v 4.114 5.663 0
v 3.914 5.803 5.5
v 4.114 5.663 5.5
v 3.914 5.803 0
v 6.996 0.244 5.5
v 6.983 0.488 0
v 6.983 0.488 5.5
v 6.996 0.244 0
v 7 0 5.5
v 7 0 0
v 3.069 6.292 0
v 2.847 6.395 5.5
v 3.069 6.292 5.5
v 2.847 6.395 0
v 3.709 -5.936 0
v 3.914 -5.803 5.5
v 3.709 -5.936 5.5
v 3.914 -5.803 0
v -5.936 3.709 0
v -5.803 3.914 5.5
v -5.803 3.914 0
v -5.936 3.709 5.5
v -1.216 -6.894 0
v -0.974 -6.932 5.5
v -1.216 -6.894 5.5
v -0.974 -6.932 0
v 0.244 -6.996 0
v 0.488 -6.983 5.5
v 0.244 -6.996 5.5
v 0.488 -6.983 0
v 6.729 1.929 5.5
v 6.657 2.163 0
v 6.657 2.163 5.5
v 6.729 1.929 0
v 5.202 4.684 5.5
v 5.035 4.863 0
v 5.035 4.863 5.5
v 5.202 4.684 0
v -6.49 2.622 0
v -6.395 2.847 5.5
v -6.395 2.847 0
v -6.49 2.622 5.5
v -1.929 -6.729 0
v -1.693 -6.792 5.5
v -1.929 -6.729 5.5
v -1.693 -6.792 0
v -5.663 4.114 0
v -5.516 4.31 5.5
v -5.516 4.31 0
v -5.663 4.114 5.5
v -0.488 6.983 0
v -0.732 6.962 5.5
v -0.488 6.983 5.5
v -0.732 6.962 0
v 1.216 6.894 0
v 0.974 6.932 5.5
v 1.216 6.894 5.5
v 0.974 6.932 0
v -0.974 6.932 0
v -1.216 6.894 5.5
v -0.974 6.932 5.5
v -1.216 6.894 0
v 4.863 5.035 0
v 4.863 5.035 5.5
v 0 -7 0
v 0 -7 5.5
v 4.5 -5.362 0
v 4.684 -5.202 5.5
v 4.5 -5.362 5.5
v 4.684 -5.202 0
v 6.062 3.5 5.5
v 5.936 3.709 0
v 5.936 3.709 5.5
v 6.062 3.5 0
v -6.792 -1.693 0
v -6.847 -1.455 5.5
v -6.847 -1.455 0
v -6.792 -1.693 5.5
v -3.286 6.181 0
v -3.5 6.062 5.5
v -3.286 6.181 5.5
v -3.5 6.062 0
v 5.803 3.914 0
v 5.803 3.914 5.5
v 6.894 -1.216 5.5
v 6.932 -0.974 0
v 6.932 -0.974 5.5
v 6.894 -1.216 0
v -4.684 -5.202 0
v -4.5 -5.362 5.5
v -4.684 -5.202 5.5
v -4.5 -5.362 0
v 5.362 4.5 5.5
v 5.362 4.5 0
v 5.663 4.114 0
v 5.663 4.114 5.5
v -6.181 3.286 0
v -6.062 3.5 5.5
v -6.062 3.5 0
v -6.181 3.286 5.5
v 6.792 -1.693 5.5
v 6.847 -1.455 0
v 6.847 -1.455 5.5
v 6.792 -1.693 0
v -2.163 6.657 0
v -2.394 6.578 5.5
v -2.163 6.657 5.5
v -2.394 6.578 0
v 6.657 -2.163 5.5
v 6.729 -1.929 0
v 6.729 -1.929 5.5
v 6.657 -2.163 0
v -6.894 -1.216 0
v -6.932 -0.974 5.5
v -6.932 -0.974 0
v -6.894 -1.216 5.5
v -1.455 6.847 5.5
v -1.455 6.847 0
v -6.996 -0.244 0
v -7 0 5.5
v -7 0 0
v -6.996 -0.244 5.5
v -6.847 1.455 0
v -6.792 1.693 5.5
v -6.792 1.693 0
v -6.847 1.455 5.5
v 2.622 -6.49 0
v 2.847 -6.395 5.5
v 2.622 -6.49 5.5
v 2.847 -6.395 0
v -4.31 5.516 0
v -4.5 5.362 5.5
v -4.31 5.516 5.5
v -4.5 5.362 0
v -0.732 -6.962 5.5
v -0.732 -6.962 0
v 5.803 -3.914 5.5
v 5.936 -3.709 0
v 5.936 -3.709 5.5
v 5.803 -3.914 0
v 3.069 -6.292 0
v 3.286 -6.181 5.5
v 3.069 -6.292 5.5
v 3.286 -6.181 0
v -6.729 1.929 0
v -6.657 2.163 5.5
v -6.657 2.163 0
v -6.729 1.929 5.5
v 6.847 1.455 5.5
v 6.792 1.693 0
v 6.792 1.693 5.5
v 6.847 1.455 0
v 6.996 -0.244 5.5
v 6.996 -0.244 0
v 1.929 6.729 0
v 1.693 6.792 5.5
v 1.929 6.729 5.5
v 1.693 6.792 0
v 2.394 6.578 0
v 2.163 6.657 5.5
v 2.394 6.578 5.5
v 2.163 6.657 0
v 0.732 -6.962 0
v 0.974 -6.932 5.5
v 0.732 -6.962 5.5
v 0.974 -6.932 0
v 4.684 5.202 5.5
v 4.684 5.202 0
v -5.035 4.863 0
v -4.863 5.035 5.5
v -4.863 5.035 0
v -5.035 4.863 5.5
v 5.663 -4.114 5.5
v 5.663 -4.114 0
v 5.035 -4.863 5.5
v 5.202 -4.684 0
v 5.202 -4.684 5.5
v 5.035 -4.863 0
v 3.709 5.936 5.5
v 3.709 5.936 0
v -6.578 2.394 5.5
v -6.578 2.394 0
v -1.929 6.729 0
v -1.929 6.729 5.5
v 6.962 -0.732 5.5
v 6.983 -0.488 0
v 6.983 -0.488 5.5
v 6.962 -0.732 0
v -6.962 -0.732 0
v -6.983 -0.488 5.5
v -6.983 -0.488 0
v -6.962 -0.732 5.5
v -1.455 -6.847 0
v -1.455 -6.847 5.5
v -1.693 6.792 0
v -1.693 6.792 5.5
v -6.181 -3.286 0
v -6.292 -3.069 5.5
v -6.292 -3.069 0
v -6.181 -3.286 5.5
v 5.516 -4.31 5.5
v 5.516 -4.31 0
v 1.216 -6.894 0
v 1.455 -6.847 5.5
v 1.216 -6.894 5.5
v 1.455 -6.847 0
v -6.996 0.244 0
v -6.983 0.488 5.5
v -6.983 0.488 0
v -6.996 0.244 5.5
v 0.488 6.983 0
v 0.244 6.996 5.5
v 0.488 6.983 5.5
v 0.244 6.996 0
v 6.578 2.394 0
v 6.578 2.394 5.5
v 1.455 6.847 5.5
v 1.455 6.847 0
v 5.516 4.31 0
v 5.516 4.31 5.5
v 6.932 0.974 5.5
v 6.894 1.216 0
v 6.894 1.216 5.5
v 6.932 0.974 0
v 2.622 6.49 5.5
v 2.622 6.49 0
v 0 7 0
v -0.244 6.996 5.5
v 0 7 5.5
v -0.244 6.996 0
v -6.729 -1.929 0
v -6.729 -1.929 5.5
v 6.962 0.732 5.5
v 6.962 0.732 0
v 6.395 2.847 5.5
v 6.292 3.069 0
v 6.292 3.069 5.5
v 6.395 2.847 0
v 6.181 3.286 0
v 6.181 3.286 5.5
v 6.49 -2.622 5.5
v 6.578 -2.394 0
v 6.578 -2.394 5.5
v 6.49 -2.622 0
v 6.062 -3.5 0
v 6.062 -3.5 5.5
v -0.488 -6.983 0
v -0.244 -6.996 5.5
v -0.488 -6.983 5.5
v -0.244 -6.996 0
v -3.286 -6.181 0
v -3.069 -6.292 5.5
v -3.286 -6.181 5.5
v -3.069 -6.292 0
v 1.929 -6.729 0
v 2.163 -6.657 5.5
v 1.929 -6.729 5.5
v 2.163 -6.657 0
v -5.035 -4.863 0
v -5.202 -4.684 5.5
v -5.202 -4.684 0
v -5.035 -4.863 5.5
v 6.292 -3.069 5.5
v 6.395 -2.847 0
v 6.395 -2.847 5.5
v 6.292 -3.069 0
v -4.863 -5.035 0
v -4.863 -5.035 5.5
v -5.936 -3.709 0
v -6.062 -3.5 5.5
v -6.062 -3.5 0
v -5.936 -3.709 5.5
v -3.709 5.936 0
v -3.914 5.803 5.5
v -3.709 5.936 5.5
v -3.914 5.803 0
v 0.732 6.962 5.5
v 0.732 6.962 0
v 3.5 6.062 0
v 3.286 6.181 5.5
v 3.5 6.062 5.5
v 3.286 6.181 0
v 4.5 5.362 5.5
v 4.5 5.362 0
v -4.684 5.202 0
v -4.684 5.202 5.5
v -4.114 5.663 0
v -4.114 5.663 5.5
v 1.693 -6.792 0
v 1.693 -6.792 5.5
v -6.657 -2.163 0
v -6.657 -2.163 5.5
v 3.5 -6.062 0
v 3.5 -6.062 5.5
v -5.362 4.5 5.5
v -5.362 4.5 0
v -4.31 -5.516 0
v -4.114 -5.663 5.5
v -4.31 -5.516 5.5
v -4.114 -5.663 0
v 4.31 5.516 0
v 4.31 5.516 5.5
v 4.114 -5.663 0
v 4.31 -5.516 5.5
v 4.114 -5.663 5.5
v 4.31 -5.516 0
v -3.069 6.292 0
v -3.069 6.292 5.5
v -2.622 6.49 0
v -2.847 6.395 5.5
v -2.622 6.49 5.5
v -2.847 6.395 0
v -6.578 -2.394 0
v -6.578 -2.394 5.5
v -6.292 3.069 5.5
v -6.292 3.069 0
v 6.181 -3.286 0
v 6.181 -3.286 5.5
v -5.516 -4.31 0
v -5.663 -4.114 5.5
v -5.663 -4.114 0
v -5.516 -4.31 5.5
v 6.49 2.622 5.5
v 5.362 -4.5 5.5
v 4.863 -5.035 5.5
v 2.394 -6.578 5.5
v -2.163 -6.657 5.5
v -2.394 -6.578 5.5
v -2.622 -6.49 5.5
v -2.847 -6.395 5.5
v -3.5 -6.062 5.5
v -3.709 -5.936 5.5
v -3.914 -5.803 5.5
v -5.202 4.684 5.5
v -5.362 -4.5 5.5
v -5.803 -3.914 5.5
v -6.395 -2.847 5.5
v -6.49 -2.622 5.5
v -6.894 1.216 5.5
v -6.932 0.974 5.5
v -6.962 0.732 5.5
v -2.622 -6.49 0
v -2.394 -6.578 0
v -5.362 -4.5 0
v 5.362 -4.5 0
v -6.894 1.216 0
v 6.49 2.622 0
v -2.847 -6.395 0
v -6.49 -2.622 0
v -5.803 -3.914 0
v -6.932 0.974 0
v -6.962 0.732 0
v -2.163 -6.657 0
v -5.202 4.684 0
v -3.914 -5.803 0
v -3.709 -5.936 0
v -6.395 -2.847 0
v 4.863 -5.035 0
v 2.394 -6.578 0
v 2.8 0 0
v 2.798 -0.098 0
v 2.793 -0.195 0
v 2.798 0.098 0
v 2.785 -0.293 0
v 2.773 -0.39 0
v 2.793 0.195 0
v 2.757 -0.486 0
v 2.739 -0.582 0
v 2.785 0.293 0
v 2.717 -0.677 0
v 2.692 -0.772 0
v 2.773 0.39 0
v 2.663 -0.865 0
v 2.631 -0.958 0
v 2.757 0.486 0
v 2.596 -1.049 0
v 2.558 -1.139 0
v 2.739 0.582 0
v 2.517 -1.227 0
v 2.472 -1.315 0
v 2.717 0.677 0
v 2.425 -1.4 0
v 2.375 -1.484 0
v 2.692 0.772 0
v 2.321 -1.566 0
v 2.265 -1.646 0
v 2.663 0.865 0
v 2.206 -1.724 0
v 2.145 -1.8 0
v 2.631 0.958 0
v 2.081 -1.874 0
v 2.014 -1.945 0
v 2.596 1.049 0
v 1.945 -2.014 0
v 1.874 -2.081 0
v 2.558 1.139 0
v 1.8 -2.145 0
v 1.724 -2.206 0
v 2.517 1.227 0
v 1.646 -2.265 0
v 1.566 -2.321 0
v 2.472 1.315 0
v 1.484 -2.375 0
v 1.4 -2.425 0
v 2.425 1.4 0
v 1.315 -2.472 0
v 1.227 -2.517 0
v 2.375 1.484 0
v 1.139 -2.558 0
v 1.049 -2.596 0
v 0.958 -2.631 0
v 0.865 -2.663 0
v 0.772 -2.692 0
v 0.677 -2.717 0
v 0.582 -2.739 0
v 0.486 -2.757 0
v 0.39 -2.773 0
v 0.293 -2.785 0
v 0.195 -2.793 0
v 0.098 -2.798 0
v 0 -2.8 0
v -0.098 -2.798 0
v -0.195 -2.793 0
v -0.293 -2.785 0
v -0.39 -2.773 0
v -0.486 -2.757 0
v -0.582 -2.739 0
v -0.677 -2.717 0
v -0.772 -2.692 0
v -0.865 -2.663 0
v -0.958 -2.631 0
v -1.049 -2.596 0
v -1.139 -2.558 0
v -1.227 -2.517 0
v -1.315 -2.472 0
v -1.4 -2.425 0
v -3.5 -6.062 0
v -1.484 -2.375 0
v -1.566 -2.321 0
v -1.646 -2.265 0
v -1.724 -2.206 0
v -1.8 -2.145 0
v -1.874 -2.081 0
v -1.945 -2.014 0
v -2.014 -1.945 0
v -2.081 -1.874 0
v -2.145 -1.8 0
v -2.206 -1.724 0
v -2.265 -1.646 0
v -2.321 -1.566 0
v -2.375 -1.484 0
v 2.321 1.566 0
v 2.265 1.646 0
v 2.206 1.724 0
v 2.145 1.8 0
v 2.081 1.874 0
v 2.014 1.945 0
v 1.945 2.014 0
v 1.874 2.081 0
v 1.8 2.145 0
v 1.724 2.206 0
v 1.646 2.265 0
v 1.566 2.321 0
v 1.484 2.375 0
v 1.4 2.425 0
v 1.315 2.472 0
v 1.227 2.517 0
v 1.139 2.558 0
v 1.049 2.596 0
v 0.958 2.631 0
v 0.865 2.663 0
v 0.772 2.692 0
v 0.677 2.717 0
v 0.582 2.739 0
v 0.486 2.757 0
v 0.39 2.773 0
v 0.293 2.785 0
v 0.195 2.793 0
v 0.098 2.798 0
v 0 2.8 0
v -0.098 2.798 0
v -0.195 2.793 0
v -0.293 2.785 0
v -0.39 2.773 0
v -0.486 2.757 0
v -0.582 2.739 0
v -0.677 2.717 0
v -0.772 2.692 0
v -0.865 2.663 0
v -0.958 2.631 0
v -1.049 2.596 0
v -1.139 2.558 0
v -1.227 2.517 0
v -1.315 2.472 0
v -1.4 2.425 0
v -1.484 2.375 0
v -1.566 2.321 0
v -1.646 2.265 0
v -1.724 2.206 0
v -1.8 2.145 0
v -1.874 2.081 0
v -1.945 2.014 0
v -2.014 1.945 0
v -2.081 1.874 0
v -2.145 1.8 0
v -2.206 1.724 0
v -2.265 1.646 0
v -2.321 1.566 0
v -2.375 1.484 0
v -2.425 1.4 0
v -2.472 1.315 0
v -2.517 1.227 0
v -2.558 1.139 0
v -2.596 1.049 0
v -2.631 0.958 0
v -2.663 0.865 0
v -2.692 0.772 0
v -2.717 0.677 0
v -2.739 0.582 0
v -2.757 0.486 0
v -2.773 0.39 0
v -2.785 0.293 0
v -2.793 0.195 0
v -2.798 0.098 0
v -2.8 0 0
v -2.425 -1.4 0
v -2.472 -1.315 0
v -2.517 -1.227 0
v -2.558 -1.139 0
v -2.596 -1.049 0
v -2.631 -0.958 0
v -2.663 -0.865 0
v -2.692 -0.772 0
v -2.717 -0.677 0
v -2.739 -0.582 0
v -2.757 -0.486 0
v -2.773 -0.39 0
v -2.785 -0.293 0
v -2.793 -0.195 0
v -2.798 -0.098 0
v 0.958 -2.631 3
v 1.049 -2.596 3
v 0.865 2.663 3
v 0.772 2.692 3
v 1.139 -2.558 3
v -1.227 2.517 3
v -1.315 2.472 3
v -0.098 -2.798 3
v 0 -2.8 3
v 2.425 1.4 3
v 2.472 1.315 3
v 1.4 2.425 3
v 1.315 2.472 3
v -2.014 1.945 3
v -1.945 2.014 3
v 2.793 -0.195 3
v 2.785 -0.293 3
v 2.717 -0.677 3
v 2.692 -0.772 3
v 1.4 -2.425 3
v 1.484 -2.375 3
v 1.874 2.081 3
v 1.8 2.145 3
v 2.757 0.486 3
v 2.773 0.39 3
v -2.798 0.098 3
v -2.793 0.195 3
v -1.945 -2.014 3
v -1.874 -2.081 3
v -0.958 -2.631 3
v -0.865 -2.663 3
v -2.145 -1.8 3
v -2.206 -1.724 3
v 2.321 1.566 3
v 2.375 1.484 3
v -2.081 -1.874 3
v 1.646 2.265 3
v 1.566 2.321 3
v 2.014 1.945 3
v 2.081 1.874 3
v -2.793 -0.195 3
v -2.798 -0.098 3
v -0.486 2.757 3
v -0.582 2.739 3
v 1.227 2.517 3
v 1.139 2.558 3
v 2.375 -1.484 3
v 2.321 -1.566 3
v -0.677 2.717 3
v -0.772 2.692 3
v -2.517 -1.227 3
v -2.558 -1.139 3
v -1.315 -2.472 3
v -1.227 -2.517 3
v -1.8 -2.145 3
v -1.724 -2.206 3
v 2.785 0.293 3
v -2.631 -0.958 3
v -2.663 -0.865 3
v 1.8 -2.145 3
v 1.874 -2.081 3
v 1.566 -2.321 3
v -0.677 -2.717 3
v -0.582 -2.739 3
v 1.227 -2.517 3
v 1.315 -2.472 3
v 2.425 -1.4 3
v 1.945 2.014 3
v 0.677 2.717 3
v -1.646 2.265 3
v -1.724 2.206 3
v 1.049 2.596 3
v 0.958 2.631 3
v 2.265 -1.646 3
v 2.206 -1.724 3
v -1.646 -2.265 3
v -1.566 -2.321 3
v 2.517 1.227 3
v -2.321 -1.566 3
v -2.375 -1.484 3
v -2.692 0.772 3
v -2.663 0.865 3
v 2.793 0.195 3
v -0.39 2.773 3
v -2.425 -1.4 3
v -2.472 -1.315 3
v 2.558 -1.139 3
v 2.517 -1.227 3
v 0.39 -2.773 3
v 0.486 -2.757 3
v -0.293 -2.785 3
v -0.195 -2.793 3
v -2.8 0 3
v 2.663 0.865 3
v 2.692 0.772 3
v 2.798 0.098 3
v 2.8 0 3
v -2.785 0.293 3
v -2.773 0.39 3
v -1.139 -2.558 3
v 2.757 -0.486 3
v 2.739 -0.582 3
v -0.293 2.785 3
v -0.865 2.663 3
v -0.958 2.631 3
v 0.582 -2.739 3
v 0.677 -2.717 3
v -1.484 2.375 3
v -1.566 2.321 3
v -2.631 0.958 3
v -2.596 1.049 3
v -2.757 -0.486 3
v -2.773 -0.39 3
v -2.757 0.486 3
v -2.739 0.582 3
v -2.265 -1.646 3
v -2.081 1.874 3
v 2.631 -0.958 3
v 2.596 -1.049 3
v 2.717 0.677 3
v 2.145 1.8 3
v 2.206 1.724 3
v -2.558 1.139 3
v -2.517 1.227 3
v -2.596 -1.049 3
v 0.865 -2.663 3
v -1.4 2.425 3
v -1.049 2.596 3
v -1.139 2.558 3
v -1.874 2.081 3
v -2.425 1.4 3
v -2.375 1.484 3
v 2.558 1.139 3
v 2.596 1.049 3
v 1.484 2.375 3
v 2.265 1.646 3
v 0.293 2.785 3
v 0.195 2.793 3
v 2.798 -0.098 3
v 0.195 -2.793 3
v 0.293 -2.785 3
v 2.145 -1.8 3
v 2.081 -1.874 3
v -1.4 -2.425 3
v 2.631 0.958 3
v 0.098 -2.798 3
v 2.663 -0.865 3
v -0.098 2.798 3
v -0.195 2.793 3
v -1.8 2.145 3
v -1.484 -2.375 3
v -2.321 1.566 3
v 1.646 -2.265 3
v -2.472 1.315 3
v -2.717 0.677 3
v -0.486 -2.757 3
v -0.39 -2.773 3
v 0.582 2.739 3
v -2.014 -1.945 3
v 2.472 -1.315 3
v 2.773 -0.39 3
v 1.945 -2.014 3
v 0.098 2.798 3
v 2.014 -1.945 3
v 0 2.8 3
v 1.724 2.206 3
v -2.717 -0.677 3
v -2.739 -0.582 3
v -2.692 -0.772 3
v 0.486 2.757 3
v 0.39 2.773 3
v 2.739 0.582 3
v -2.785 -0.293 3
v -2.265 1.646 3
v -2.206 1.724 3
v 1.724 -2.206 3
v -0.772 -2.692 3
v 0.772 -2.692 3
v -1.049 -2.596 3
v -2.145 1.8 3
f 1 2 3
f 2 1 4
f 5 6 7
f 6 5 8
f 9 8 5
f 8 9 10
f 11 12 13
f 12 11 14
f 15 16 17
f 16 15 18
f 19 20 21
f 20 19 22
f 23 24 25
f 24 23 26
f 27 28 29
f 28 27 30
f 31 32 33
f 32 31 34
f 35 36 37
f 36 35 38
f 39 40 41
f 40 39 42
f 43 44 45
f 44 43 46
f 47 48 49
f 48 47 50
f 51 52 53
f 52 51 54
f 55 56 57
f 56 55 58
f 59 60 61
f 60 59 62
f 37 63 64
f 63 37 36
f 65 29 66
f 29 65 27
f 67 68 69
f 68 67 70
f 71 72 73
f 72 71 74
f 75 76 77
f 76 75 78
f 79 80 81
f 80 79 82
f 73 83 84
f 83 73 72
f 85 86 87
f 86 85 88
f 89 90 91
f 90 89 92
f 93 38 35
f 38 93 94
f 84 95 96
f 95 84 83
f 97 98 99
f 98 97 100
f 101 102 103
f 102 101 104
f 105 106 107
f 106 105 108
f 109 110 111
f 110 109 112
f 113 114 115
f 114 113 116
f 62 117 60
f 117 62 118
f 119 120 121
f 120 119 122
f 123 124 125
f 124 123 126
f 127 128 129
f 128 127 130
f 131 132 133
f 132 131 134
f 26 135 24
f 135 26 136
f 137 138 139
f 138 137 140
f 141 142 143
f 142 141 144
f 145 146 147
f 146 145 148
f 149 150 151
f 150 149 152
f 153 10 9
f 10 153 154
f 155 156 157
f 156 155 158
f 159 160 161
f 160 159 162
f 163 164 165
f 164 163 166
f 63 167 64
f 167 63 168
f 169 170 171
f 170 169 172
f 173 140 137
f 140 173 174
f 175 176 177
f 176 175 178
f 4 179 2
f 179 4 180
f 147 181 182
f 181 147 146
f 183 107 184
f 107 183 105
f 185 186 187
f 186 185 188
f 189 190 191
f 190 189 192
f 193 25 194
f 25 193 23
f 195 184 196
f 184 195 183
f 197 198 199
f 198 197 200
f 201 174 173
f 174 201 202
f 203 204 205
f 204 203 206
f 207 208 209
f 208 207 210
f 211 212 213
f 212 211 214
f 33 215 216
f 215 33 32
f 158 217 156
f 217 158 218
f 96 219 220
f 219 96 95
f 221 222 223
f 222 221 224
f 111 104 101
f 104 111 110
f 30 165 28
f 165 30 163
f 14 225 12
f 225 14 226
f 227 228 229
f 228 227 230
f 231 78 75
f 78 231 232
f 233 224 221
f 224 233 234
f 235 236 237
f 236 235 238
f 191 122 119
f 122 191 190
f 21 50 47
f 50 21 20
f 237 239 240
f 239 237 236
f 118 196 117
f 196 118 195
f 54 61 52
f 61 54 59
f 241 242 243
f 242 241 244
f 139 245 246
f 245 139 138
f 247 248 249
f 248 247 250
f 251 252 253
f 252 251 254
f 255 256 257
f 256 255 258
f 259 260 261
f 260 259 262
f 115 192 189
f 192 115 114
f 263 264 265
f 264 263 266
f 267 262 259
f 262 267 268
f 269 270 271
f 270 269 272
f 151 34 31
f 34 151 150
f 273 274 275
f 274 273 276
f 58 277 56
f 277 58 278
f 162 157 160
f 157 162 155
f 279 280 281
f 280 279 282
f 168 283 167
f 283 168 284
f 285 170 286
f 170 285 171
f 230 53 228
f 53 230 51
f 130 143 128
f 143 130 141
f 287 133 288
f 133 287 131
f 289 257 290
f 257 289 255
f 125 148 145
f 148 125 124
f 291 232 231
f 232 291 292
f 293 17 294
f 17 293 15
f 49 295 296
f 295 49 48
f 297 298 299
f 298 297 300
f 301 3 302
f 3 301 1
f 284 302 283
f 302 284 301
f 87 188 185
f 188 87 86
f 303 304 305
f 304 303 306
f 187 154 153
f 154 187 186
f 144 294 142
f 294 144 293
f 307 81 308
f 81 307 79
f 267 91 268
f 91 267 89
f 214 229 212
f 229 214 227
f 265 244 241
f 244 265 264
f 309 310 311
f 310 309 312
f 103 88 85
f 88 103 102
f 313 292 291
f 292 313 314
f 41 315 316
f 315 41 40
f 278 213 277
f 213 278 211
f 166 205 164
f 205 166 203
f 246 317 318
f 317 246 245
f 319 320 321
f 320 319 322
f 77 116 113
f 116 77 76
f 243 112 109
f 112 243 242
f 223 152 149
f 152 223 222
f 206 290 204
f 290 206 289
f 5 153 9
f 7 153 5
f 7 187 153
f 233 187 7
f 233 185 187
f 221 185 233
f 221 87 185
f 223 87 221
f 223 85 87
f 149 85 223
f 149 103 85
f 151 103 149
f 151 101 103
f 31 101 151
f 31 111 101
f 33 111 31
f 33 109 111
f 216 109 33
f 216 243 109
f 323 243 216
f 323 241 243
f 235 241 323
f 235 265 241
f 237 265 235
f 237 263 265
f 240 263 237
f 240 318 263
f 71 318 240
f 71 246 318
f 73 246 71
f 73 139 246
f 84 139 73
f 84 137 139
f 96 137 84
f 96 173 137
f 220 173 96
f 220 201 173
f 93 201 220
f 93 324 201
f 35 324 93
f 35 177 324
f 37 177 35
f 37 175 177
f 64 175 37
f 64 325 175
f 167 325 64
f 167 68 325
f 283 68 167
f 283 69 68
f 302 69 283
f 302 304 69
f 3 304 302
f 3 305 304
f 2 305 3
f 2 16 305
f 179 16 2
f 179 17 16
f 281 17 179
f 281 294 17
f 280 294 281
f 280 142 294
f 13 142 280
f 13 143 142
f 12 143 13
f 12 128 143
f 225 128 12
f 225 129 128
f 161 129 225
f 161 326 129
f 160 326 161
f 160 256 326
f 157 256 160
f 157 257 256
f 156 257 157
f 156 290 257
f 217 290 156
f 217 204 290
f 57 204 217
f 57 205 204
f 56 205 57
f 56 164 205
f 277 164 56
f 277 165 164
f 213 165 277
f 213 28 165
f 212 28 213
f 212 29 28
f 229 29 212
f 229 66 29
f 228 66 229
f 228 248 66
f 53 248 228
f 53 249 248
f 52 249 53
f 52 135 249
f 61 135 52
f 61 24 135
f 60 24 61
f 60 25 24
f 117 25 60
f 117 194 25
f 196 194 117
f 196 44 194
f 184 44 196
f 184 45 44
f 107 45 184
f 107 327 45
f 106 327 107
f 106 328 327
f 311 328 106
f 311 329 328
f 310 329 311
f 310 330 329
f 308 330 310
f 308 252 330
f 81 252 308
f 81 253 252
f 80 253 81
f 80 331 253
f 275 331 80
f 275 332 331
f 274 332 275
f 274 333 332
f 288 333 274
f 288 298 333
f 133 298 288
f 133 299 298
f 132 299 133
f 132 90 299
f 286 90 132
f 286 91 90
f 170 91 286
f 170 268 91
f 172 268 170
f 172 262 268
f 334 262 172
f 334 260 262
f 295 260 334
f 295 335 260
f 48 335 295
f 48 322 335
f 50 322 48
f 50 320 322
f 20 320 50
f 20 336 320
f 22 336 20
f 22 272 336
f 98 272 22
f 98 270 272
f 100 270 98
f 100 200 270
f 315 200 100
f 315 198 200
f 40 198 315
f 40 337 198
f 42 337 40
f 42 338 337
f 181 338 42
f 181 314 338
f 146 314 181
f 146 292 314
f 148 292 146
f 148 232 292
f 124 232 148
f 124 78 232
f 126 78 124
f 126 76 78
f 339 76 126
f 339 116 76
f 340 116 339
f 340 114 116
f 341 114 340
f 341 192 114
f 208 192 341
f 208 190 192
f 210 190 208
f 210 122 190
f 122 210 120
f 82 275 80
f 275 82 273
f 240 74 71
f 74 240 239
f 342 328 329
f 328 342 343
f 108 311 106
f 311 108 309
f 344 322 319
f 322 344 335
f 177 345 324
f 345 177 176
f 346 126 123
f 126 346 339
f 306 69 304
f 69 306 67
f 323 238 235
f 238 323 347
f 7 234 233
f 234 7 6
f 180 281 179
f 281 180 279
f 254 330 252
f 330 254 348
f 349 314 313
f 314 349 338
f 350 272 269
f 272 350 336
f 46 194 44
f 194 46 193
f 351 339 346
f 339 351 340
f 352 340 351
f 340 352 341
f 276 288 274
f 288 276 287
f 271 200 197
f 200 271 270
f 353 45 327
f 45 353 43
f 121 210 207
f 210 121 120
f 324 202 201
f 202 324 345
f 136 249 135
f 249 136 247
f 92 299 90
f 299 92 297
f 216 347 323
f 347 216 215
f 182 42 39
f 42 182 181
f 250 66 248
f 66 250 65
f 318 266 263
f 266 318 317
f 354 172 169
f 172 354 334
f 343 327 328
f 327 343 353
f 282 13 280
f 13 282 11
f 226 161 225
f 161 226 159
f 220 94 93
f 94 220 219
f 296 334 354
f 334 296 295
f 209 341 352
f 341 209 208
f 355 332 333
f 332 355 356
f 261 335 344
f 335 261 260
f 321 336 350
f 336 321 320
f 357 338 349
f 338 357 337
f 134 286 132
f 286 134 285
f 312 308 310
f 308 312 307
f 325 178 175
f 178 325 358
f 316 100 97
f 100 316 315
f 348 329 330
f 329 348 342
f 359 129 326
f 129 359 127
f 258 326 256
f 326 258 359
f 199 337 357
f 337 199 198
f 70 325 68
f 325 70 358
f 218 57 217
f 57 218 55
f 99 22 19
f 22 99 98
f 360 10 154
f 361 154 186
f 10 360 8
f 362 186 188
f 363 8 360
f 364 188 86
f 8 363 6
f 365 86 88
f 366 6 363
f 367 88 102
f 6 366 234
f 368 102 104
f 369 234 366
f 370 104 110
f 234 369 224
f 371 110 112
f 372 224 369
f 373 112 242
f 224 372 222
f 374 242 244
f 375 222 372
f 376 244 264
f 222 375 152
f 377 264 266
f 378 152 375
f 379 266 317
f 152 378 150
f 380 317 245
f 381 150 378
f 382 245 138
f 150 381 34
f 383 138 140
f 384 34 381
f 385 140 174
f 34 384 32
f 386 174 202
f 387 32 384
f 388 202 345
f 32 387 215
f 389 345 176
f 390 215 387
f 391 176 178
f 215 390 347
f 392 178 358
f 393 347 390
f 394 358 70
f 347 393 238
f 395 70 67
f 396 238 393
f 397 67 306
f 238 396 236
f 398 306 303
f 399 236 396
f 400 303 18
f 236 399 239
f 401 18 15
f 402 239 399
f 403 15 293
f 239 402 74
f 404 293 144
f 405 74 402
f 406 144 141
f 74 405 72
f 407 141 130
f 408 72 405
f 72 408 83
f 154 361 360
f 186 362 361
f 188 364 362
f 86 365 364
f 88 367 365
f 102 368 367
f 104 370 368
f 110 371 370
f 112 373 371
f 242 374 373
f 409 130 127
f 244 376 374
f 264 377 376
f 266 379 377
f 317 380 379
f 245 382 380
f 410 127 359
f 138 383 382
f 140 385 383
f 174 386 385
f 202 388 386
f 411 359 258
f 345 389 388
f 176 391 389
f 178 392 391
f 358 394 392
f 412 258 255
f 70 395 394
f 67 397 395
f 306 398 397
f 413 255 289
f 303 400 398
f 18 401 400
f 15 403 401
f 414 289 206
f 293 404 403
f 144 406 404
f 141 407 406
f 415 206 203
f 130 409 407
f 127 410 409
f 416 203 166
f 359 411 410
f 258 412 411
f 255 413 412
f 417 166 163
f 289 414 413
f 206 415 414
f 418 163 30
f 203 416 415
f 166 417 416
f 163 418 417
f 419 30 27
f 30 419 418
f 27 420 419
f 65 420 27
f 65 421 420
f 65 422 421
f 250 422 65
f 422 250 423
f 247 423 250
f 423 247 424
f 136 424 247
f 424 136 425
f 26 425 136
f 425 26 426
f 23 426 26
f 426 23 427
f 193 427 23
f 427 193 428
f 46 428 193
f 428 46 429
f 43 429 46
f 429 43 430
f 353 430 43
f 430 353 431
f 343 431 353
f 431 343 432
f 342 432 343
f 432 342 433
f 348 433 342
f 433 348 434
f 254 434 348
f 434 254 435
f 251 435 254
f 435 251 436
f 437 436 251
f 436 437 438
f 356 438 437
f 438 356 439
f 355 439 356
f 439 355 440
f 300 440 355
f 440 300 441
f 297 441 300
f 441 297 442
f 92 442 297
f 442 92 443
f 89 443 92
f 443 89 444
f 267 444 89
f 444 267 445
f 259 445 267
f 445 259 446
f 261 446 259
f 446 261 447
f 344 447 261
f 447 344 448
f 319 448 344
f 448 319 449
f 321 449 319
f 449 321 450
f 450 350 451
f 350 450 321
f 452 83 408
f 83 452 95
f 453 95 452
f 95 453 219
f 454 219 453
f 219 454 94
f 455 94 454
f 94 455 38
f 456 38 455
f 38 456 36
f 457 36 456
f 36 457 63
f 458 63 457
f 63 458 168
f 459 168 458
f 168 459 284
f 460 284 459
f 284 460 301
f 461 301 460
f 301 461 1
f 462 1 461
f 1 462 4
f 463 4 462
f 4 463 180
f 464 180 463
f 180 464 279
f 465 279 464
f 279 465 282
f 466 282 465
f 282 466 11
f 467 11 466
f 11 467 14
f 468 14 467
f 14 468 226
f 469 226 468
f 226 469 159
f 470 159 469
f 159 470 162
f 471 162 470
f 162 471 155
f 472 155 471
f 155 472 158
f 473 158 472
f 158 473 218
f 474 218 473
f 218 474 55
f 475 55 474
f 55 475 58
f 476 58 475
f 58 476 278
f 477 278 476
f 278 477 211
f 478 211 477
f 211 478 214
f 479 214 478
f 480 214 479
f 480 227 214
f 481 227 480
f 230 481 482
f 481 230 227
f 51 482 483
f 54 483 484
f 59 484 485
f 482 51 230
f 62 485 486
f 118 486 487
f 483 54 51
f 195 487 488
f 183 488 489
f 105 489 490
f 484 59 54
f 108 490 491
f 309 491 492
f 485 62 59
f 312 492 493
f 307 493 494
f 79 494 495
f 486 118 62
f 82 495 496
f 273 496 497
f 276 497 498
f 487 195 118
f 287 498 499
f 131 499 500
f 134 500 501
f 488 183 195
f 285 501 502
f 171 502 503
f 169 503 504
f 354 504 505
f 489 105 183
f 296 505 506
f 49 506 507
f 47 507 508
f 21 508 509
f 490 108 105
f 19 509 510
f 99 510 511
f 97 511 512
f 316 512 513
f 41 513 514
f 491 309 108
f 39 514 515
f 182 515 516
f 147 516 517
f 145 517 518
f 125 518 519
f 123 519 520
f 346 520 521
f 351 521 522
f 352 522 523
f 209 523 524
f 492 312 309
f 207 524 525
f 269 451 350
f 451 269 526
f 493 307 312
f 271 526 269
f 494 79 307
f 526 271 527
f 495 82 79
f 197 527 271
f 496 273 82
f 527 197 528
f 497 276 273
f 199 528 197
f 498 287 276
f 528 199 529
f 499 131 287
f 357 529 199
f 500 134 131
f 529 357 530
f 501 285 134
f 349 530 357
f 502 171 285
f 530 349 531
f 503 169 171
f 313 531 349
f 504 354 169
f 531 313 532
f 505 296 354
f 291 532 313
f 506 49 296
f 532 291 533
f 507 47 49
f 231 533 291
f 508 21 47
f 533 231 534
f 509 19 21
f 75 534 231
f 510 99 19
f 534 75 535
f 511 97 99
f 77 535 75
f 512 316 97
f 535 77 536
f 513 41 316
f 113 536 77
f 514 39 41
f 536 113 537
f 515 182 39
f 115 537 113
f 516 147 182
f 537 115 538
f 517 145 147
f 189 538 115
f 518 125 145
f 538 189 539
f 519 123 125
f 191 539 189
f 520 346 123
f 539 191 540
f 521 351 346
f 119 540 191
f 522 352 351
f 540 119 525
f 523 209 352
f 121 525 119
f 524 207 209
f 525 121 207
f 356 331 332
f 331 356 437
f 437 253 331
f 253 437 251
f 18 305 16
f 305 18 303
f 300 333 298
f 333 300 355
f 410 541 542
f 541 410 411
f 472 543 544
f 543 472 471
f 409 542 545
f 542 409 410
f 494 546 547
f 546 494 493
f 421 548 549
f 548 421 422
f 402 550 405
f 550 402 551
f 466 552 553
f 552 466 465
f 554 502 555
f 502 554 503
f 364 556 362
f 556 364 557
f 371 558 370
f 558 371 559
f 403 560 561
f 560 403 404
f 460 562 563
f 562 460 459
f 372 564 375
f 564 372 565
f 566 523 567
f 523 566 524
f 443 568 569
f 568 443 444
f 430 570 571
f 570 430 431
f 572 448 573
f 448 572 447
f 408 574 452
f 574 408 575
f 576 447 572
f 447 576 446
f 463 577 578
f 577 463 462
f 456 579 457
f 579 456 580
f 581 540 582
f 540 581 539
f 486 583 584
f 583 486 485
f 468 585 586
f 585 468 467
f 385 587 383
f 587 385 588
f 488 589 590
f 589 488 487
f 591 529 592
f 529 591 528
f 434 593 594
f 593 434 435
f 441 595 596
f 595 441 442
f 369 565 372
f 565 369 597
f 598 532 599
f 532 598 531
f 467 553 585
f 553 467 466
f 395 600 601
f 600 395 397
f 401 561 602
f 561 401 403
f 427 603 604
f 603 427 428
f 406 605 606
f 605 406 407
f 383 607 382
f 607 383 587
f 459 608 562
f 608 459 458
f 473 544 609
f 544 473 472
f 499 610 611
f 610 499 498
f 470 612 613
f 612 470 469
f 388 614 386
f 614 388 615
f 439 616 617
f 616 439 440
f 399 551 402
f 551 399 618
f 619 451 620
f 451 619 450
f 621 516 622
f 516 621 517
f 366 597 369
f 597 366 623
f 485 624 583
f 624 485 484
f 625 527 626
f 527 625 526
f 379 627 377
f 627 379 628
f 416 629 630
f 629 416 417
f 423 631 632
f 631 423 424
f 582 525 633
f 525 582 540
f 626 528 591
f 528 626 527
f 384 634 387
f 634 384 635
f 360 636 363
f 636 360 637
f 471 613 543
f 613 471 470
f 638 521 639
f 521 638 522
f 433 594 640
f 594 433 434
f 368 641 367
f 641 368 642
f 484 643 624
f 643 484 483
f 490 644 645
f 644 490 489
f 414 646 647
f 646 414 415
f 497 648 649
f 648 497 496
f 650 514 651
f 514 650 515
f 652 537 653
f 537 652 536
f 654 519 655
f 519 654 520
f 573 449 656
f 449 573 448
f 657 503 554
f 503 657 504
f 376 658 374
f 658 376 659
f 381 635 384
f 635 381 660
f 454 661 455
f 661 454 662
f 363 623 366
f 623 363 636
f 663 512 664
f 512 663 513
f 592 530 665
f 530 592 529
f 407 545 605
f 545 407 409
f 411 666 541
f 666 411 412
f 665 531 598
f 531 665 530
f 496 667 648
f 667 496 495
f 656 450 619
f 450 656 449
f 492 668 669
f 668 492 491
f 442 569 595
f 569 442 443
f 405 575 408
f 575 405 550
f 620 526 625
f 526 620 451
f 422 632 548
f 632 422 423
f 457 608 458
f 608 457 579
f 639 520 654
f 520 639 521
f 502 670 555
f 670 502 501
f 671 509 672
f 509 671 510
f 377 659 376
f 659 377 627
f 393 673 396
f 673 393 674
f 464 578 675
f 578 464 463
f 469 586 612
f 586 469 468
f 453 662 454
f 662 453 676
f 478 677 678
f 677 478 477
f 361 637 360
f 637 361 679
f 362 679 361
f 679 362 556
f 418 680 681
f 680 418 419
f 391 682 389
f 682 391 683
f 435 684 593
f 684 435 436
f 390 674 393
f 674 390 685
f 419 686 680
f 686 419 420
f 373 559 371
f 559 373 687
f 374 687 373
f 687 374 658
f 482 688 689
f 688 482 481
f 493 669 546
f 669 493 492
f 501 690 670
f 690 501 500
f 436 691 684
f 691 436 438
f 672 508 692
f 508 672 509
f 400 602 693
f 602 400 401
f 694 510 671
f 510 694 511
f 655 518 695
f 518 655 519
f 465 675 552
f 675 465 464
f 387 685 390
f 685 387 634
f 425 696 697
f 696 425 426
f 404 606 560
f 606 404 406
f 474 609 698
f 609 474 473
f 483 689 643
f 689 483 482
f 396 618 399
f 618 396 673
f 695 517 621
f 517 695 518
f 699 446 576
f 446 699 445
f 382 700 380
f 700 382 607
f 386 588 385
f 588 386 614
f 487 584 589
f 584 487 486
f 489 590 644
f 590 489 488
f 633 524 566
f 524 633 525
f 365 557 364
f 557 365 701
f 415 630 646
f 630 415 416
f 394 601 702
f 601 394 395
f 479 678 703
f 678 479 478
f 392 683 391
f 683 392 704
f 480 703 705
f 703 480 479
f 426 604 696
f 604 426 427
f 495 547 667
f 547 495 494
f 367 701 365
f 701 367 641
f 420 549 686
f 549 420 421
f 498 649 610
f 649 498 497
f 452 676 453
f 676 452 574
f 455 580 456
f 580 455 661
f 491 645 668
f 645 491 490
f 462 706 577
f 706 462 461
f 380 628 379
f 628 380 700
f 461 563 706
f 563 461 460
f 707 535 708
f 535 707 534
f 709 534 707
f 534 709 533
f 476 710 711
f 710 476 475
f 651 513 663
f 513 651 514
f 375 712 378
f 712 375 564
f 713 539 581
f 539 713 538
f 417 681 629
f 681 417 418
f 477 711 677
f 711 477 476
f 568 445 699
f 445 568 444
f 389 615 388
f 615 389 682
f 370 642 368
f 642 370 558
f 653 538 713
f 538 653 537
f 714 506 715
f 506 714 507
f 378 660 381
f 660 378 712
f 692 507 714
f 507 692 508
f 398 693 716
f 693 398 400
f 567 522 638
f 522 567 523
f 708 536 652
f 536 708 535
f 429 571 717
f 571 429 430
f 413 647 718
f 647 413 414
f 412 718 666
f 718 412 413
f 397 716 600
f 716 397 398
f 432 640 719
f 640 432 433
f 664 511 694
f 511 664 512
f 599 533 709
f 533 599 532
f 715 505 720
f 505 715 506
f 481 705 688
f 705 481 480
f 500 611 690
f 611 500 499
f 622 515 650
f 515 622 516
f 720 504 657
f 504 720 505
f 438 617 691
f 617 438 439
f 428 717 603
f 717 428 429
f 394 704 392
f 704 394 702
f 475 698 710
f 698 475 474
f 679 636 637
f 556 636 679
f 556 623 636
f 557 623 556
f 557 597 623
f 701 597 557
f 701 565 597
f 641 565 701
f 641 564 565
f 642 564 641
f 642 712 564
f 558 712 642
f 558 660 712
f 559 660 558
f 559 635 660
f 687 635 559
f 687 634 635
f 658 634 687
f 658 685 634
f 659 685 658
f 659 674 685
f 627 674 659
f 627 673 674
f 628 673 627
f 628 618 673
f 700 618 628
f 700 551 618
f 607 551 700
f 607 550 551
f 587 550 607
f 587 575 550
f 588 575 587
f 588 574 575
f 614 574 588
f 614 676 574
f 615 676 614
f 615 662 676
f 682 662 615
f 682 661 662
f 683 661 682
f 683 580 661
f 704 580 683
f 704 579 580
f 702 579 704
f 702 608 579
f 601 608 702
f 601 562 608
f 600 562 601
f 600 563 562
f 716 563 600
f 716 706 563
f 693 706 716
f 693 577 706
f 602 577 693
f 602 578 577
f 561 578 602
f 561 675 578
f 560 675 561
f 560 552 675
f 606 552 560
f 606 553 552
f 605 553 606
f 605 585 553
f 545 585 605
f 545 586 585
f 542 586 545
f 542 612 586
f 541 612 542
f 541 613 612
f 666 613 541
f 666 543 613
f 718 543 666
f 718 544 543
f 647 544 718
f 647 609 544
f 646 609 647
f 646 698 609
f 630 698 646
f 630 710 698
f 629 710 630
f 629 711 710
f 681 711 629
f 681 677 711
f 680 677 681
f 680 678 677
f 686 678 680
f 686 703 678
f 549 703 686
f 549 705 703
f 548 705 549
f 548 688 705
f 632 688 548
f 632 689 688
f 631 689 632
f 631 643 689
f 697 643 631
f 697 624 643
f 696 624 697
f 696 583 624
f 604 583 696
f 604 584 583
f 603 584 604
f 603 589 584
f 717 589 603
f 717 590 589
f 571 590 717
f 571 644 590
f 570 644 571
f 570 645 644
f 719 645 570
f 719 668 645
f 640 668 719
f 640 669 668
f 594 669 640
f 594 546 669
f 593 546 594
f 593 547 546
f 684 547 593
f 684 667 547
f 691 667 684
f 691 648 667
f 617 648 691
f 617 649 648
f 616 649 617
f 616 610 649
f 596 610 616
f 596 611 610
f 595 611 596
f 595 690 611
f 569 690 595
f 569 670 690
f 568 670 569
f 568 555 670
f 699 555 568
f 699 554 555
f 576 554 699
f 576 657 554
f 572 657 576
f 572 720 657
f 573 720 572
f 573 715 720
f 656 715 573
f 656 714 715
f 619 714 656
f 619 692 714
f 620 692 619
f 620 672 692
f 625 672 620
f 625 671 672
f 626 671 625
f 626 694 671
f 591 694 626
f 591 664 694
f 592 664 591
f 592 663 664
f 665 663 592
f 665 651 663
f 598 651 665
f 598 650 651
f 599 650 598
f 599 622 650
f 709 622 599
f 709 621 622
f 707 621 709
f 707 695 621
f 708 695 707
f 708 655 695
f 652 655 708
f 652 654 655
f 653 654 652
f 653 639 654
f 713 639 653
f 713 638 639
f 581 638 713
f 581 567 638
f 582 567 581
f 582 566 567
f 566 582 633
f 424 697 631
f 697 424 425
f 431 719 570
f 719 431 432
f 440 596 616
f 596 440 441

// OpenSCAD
$fn=180;

difference() {
	cylinder(h=5.5, d=14);
	cylinder(h=3, d=5.6);
}
